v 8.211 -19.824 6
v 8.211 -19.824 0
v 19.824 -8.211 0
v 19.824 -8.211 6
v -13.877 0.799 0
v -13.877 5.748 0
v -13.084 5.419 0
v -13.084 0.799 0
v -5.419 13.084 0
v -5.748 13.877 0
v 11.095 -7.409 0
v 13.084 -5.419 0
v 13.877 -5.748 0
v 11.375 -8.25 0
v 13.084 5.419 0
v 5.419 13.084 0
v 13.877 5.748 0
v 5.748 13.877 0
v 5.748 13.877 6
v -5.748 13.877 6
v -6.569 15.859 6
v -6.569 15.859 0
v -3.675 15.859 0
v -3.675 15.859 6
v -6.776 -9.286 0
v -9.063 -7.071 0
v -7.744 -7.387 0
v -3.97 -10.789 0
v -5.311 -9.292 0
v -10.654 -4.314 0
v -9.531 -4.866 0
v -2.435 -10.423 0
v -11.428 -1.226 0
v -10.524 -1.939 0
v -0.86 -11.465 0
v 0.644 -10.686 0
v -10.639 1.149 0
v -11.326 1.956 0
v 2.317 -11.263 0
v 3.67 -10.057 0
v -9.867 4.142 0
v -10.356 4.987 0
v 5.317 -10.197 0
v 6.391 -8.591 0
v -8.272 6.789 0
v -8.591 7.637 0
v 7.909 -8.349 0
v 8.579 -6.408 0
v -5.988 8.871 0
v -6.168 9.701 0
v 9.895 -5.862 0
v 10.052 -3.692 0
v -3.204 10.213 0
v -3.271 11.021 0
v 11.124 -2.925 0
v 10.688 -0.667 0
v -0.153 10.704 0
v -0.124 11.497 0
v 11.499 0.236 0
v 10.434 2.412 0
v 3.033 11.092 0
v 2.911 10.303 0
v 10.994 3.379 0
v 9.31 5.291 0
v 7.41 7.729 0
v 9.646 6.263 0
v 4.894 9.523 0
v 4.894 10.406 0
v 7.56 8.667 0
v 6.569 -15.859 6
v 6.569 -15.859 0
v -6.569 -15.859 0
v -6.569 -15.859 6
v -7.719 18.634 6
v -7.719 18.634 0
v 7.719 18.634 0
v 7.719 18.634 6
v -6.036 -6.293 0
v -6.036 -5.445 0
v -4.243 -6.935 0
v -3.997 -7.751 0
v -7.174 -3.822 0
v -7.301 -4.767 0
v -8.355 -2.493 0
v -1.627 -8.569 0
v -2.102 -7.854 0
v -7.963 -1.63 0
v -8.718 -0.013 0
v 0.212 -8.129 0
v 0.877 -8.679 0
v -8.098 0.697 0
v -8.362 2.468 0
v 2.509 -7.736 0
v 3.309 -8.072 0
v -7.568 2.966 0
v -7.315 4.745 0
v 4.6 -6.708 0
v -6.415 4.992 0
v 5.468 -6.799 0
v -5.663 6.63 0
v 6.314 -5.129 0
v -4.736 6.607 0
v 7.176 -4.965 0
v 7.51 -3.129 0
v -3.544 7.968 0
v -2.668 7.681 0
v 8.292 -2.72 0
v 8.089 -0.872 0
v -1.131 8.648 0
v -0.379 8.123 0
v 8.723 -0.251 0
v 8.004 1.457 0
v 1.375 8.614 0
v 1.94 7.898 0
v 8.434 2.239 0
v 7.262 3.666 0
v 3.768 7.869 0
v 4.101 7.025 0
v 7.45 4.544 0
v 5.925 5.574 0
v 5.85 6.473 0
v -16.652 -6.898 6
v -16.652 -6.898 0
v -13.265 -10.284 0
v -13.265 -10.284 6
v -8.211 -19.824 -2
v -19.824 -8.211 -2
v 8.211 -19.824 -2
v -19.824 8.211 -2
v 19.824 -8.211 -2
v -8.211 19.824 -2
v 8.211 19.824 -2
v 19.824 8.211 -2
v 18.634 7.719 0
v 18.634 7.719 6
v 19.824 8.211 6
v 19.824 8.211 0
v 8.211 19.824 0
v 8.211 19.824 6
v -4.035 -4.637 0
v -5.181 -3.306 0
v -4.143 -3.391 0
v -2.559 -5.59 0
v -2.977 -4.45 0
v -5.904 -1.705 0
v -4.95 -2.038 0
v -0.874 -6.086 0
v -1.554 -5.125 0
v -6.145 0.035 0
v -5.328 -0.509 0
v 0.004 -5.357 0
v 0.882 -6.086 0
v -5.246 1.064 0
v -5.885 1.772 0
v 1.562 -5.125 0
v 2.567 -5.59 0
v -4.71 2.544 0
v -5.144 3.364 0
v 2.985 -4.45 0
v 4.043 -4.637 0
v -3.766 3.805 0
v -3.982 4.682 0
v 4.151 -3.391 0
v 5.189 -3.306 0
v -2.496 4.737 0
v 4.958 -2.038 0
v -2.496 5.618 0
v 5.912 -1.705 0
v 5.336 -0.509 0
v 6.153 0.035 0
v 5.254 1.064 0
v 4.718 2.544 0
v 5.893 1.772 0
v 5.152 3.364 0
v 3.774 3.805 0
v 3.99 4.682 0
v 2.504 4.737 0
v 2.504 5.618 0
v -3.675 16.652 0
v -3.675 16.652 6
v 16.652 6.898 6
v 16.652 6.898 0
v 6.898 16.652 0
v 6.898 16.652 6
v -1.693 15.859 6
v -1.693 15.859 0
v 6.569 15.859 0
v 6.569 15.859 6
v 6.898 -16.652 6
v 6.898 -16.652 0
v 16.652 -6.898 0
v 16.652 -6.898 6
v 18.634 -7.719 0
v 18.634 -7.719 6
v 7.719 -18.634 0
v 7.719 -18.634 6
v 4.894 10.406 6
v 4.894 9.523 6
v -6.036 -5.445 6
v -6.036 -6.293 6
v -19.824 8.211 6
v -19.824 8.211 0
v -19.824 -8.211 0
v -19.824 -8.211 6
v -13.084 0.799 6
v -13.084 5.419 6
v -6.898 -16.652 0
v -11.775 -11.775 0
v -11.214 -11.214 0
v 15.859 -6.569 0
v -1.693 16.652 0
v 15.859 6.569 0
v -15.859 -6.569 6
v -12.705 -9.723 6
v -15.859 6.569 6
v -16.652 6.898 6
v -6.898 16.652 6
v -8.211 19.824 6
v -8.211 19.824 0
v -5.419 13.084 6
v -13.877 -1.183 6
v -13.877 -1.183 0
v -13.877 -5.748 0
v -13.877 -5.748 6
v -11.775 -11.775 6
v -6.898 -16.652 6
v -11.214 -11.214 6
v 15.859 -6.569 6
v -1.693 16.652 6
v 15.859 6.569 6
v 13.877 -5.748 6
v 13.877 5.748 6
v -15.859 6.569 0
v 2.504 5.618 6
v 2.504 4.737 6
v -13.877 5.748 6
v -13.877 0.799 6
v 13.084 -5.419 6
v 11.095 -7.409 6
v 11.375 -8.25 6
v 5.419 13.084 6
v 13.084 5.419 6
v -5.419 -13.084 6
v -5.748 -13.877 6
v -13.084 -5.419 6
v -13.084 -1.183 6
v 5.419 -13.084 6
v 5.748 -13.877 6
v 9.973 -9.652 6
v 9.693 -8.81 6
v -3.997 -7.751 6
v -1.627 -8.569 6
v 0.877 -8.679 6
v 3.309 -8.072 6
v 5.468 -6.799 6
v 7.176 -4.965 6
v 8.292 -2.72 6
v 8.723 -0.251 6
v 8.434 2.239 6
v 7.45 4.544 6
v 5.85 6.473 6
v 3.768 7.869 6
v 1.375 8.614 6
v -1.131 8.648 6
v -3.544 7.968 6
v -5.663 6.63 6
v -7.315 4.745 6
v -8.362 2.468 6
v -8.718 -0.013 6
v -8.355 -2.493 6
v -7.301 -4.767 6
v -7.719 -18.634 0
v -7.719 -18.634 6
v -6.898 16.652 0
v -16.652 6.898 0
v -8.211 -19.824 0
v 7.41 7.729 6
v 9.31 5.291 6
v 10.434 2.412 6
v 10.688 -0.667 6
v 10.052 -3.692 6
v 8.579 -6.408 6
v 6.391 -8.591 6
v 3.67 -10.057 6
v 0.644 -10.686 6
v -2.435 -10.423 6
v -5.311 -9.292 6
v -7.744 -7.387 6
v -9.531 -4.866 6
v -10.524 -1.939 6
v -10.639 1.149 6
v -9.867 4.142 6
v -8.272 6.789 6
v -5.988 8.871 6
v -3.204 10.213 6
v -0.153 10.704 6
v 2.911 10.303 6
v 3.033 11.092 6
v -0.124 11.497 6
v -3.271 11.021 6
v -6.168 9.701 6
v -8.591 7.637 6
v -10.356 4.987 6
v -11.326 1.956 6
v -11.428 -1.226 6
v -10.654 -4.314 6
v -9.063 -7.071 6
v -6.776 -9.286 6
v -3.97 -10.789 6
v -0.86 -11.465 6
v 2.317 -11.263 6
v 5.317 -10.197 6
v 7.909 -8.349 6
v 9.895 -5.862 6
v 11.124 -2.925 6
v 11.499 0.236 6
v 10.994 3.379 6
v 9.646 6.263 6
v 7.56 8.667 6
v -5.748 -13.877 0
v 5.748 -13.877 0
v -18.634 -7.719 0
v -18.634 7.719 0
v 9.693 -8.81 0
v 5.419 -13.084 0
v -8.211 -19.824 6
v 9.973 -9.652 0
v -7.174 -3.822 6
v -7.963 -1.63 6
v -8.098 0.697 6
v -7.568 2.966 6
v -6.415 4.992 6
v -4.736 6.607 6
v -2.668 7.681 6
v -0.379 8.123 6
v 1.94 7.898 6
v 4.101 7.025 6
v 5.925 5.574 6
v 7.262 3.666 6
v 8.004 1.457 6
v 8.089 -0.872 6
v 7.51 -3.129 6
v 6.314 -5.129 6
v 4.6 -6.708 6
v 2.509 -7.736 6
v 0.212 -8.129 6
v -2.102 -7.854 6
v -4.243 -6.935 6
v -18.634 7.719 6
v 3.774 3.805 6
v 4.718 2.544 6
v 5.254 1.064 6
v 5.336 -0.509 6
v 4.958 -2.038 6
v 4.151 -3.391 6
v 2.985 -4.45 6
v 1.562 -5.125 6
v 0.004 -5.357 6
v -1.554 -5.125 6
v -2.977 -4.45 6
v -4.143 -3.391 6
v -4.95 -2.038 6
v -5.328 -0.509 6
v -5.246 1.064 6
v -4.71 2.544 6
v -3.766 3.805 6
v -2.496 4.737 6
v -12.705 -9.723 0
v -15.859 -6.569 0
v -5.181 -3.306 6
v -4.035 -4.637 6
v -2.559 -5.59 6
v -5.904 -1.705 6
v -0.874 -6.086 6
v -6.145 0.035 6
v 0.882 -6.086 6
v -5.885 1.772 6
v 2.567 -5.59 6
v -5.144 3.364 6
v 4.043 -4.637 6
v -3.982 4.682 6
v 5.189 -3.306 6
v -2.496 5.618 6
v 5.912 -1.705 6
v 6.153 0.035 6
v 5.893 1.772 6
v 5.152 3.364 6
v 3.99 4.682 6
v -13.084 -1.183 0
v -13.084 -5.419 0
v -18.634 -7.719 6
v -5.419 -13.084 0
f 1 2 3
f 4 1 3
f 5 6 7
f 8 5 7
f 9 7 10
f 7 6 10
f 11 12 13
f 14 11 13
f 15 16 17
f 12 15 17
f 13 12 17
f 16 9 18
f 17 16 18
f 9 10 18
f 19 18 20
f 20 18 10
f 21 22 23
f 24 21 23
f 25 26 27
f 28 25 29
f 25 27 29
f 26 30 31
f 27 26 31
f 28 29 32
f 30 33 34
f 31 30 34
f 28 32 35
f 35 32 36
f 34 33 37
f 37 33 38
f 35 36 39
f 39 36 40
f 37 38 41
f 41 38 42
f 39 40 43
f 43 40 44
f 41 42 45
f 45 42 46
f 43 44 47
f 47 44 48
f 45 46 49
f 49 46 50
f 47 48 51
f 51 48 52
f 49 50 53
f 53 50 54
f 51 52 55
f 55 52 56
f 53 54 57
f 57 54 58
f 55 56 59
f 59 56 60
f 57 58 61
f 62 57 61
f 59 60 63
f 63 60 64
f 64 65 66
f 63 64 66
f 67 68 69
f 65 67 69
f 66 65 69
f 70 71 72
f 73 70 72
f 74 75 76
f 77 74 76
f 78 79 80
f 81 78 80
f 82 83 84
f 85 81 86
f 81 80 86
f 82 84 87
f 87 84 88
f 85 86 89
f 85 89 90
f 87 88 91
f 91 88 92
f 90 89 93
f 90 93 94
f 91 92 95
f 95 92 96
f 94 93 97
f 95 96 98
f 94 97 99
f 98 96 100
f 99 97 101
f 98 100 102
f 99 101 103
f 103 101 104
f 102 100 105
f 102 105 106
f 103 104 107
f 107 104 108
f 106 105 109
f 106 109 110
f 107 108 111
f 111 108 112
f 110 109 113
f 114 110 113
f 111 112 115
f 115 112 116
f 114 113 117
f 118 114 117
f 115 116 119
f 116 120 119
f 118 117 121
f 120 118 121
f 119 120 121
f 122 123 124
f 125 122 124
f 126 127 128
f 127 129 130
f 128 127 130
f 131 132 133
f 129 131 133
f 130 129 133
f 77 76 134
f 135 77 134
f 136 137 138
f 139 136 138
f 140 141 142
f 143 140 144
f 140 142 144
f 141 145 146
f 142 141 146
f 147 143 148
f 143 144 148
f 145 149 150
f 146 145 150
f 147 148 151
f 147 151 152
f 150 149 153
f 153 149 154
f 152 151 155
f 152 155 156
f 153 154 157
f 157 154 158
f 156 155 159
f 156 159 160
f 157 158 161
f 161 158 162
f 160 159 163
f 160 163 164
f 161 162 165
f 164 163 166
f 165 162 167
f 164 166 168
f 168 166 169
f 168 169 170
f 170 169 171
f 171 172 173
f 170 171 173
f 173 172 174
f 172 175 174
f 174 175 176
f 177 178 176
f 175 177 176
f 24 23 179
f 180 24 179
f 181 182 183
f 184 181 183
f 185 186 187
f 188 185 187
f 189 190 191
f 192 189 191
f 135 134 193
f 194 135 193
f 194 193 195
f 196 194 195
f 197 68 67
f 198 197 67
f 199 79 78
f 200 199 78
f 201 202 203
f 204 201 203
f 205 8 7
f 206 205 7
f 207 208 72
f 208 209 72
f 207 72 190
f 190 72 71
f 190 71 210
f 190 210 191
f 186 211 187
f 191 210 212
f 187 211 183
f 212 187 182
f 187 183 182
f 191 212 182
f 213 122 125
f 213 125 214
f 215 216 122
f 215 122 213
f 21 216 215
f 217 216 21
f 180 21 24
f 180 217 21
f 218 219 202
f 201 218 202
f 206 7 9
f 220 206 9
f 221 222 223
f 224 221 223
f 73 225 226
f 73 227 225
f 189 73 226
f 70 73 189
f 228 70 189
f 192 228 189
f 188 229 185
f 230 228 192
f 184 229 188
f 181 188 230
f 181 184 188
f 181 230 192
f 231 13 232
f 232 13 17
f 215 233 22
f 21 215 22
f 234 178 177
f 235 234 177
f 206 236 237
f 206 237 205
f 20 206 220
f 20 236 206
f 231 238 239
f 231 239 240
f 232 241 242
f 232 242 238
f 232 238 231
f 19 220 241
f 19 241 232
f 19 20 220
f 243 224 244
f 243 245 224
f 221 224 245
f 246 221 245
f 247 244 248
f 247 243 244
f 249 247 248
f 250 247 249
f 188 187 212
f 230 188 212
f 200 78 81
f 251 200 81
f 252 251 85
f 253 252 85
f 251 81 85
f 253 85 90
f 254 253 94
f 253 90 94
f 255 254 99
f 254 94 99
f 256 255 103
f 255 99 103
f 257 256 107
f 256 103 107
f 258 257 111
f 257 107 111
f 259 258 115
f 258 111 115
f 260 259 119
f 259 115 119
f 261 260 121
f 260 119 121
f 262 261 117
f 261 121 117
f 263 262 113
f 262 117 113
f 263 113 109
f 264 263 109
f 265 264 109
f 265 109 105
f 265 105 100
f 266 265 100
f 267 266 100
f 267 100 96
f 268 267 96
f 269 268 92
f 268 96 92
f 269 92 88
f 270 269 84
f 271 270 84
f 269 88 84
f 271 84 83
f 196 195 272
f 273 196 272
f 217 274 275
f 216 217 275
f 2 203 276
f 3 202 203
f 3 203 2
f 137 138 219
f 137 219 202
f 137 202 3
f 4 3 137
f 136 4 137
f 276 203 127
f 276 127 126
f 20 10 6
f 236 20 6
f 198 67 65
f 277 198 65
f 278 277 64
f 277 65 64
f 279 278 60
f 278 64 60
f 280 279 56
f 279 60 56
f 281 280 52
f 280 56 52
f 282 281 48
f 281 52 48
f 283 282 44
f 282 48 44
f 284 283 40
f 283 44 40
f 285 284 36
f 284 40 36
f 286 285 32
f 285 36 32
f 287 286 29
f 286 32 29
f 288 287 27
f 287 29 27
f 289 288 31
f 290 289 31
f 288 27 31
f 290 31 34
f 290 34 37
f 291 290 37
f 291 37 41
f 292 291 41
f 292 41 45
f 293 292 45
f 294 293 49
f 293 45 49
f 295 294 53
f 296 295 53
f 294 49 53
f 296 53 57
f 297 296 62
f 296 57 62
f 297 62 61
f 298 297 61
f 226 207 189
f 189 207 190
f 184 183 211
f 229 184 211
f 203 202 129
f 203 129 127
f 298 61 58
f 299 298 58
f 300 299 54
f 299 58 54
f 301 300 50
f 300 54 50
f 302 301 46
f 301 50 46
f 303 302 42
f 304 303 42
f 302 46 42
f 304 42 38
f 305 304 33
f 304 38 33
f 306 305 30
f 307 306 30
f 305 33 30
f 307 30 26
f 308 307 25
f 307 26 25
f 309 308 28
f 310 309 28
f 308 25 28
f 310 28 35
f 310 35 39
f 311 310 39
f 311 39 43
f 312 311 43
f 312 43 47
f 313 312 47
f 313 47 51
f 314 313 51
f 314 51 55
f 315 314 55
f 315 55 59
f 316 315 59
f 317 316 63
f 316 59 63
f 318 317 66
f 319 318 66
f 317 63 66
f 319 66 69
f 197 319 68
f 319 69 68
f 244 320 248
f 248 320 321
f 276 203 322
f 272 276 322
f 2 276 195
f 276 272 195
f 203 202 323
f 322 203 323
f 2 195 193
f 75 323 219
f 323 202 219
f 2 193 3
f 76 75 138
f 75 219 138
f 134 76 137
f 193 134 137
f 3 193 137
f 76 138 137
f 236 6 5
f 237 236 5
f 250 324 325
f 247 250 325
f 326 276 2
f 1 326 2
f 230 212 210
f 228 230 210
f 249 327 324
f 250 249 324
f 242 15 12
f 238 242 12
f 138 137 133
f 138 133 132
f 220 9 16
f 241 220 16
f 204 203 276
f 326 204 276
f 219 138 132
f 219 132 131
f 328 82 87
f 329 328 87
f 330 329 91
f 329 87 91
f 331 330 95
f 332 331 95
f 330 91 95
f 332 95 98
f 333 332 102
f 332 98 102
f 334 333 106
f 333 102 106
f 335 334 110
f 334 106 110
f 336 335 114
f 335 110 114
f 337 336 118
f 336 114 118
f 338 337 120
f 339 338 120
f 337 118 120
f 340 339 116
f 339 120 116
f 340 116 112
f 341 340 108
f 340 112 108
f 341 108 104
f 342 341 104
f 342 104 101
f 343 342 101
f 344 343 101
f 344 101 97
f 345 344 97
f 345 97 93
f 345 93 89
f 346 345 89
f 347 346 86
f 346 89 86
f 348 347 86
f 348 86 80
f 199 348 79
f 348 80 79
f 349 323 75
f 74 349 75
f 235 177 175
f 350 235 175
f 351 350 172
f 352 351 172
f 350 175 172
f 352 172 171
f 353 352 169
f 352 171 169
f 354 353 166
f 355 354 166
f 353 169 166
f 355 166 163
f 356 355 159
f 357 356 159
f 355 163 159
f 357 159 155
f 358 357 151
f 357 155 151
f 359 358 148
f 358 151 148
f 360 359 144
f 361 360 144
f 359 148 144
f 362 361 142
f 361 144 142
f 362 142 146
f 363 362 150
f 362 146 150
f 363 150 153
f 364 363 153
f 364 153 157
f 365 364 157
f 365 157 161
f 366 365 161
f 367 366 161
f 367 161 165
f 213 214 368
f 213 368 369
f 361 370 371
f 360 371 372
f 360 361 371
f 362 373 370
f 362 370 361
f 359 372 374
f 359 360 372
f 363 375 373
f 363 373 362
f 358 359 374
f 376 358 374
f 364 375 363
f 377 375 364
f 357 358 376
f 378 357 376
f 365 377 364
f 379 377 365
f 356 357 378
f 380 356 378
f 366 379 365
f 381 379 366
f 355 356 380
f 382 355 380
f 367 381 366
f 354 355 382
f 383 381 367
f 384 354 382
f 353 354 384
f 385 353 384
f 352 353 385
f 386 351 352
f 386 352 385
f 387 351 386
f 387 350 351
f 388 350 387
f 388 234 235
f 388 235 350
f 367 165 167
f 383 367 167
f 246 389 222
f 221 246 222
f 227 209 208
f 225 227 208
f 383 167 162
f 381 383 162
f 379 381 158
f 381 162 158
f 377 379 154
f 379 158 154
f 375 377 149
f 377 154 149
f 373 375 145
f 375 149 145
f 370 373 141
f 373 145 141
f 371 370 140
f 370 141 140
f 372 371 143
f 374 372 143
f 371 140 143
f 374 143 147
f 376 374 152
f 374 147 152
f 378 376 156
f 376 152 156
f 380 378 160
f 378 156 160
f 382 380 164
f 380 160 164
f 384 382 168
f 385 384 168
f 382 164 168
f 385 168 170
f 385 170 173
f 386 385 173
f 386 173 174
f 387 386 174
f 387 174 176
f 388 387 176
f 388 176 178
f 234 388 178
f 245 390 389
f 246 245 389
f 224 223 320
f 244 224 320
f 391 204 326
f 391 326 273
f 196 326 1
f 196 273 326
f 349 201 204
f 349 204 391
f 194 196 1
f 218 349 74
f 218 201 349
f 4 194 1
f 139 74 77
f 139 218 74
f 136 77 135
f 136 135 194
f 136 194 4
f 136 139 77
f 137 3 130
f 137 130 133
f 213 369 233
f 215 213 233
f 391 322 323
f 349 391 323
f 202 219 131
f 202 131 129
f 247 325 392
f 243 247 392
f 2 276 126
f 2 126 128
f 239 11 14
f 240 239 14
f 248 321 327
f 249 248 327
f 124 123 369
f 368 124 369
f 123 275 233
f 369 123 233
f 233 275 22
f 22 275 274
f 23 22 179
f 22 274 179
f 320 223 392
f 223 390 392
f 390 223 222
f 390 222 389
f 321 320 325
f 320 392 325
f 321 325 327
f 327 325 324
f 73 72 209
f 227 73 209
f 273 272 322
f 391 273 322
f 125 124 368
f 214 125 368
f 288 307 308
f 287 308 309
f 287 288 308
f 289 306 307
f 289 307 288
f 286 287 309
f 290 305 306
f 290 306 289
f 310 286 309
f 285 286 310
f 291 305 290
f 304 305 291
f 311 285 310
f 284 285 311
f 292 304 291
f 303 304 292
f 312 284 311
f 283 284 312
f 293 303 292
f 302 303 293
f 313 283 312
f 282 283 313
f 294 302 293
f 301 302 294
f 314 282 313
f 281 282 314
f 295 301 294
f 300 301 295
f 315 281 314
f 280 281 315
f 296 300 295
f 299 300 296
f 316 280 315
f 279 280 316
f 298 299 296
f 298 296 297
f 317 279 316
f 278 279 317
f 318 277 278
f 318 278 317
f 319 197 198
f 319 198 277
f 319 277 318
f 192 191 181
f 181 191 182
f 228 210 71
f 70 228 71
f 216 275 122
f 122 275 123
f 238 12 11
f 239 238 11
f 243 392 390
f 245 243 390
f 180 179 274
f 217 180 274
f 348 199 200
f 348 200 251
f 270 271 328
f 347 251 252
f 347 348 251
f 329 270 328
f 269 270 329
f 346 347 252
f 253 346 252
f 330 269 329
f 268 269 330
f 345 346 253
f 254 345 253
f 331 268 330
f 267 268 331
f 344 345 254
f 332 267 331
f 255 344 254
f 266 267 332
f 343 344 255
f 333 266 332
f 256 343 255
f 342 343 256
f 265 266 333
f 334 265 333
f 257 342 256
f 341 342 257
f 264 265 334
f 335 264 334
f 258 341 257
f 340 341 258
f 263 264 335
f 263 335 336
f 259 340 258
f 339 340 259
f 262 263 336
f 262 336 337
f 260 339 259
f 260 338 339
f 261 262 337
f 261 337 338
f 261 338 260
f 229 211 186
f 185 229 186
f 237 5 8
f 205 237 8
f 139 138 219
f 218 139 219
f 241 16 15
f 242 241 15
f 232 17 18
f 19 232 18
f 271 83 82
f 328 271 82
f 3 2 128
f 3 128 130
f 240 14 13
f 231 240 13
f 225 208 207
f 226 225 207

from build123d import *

# Parameters (mm, degrees)
F1_DEPTH = 6
F3_DEPTH = 2


with BuildPart() as f1:
    # F0 (on Top) → F1 (new body)
    with BuildSketch(Plane.XY):
        Polygon((8.211314, 19.823864), (-8.211314, 19.823864), (-19.823864, 8.211314), (-19.823864, -8.211314), (-8.211314, -19.823864), (8.211314, -19.823864), (19.823864, -8.211314), (19.823864, 8.211314), align=None)
        Polygon((-18.634432, -7.718634), (-18.634432, 7.718634), (-7.718634, 18.634432), (7.718634, 18.634432), (18.634432, 7.718634), (18.634432, -7.718634), (7.718634, -18.634432), (-7.718634, -18.634432), align=None, mode=Mode.SUBTRACT)
        Polygon((-16.652045, 6.897503), (-16.652045, -6.897503), (-13.265415, -10.284133), (-12.704712, -9.72343), (-15.859091, -6.569051), (-15.859091, 6.569051), (-6.569051, 15.859091), (-3.675188, 15.859091), (-3.675188, 16.652045), (-6.897503, 16.652045), align=None)
        Polygon((-5.747919, 13.876704), (-13.876704, 5.747919), (-13.876704, 0.799376), (-13.08375, 0.799376), (-13.08375, 5.419467), (-5.419467, 13.08375), (5.419467, 13.08375), (13.08375, 5.419467), (13.08375, -5.419467), (11.09462, -7.408596), (11.374686, -8.249938), (13.876704, -5.747919), (13.876704, 5.747919), (5.747919, 13.876704), align=None)
        with BuildLine():
            Line((2.911275, 10.30254), (3.033471, 11.091557))
            ThreePointArc((3.033471, 11.091557), (-3.97036, -10.789108), (4.893661, 10.406322))
            Line((4.893661, 10.406322), (4.893661, 9.522909))
            ThreePointArc((4.893661, 9.522909), (-3.913907, -9.96216), (2.911275, 10.30254))
        make_face()
        with BuildLine():
            Line((-6.035547, -5.445288), (-6.035547, -6.293321))
            ThreePointArc((-6.035547, -6.293321), (6.719577, 5.56624), (-7.300602, -4.767054))
            Line((-7.300602, -4.767054), (-7.17364, -3.822142))
            ThreePointArc((-7.17364, -3.822142), (6.662241, 4.668522), (-6.035547, -5.445288))
        make_face()
        with BuildLine():
            Line((-2.495999, 4.737338), (-2.495999, 5.618372))
            ThreePointArc((-2.495999, 5.618372), (0.004001, -6.149483), (2.504001, 5.618372))
            Line((2.504001, 5.618372), (2.504001, 4.737338))
            ThreePointArc((2.504001, 4.737338), (0.004001, -5.356529), (-2.495999, 4.737338))
        make_face()
        Polygon((-11.774774, -11.774774), (-6.897503, -16.652045), (6.897503, -16.652045), (16.652045, -6.897503), (16.652045, 6.897503), (6.897503, 16.652045), (-1.692802, 16.652045), (-1.692802, 15.859091), (6.569051, 15.859091), (15.859091, 6.569051), (15.859091, -6.569051), (6.569051, -15.859091), (-6.569051, -15.859091), (-11.214071, -11.214071), align=None)
        Polygon((-13.876704, -1.18301), (-13.876704, -5.747919), (-5.747919, -13.876704), (5.747919, -13.876704), (9.972927, -9.651697), (9.692861, -8.810355), (5.419467, -13.08375), (-5.419467, -13.08375), (-13.08375, -5.419467), (-13.08375, -1.18301), align=None)
    extrude(amount=F1_DEPTH)


with BuildPart() as f3:
    # F2 (on Top) → F3 (new body)
    with BuildSketch(Plane.XY):
        Polygon((8.211314, -19.823864), (19.823864, -8.211314), (19.823864, 8.211314), (8.211314, 19.823864), (-8.211314, 19.823864), (-19.823864, 8.211314), (-19.823864, -8.211314), (-8.211314, -19.823864), align=None)
    extrude(amount=-F3_DEPTH)


solid = Compound([f1.part, f3.part])
